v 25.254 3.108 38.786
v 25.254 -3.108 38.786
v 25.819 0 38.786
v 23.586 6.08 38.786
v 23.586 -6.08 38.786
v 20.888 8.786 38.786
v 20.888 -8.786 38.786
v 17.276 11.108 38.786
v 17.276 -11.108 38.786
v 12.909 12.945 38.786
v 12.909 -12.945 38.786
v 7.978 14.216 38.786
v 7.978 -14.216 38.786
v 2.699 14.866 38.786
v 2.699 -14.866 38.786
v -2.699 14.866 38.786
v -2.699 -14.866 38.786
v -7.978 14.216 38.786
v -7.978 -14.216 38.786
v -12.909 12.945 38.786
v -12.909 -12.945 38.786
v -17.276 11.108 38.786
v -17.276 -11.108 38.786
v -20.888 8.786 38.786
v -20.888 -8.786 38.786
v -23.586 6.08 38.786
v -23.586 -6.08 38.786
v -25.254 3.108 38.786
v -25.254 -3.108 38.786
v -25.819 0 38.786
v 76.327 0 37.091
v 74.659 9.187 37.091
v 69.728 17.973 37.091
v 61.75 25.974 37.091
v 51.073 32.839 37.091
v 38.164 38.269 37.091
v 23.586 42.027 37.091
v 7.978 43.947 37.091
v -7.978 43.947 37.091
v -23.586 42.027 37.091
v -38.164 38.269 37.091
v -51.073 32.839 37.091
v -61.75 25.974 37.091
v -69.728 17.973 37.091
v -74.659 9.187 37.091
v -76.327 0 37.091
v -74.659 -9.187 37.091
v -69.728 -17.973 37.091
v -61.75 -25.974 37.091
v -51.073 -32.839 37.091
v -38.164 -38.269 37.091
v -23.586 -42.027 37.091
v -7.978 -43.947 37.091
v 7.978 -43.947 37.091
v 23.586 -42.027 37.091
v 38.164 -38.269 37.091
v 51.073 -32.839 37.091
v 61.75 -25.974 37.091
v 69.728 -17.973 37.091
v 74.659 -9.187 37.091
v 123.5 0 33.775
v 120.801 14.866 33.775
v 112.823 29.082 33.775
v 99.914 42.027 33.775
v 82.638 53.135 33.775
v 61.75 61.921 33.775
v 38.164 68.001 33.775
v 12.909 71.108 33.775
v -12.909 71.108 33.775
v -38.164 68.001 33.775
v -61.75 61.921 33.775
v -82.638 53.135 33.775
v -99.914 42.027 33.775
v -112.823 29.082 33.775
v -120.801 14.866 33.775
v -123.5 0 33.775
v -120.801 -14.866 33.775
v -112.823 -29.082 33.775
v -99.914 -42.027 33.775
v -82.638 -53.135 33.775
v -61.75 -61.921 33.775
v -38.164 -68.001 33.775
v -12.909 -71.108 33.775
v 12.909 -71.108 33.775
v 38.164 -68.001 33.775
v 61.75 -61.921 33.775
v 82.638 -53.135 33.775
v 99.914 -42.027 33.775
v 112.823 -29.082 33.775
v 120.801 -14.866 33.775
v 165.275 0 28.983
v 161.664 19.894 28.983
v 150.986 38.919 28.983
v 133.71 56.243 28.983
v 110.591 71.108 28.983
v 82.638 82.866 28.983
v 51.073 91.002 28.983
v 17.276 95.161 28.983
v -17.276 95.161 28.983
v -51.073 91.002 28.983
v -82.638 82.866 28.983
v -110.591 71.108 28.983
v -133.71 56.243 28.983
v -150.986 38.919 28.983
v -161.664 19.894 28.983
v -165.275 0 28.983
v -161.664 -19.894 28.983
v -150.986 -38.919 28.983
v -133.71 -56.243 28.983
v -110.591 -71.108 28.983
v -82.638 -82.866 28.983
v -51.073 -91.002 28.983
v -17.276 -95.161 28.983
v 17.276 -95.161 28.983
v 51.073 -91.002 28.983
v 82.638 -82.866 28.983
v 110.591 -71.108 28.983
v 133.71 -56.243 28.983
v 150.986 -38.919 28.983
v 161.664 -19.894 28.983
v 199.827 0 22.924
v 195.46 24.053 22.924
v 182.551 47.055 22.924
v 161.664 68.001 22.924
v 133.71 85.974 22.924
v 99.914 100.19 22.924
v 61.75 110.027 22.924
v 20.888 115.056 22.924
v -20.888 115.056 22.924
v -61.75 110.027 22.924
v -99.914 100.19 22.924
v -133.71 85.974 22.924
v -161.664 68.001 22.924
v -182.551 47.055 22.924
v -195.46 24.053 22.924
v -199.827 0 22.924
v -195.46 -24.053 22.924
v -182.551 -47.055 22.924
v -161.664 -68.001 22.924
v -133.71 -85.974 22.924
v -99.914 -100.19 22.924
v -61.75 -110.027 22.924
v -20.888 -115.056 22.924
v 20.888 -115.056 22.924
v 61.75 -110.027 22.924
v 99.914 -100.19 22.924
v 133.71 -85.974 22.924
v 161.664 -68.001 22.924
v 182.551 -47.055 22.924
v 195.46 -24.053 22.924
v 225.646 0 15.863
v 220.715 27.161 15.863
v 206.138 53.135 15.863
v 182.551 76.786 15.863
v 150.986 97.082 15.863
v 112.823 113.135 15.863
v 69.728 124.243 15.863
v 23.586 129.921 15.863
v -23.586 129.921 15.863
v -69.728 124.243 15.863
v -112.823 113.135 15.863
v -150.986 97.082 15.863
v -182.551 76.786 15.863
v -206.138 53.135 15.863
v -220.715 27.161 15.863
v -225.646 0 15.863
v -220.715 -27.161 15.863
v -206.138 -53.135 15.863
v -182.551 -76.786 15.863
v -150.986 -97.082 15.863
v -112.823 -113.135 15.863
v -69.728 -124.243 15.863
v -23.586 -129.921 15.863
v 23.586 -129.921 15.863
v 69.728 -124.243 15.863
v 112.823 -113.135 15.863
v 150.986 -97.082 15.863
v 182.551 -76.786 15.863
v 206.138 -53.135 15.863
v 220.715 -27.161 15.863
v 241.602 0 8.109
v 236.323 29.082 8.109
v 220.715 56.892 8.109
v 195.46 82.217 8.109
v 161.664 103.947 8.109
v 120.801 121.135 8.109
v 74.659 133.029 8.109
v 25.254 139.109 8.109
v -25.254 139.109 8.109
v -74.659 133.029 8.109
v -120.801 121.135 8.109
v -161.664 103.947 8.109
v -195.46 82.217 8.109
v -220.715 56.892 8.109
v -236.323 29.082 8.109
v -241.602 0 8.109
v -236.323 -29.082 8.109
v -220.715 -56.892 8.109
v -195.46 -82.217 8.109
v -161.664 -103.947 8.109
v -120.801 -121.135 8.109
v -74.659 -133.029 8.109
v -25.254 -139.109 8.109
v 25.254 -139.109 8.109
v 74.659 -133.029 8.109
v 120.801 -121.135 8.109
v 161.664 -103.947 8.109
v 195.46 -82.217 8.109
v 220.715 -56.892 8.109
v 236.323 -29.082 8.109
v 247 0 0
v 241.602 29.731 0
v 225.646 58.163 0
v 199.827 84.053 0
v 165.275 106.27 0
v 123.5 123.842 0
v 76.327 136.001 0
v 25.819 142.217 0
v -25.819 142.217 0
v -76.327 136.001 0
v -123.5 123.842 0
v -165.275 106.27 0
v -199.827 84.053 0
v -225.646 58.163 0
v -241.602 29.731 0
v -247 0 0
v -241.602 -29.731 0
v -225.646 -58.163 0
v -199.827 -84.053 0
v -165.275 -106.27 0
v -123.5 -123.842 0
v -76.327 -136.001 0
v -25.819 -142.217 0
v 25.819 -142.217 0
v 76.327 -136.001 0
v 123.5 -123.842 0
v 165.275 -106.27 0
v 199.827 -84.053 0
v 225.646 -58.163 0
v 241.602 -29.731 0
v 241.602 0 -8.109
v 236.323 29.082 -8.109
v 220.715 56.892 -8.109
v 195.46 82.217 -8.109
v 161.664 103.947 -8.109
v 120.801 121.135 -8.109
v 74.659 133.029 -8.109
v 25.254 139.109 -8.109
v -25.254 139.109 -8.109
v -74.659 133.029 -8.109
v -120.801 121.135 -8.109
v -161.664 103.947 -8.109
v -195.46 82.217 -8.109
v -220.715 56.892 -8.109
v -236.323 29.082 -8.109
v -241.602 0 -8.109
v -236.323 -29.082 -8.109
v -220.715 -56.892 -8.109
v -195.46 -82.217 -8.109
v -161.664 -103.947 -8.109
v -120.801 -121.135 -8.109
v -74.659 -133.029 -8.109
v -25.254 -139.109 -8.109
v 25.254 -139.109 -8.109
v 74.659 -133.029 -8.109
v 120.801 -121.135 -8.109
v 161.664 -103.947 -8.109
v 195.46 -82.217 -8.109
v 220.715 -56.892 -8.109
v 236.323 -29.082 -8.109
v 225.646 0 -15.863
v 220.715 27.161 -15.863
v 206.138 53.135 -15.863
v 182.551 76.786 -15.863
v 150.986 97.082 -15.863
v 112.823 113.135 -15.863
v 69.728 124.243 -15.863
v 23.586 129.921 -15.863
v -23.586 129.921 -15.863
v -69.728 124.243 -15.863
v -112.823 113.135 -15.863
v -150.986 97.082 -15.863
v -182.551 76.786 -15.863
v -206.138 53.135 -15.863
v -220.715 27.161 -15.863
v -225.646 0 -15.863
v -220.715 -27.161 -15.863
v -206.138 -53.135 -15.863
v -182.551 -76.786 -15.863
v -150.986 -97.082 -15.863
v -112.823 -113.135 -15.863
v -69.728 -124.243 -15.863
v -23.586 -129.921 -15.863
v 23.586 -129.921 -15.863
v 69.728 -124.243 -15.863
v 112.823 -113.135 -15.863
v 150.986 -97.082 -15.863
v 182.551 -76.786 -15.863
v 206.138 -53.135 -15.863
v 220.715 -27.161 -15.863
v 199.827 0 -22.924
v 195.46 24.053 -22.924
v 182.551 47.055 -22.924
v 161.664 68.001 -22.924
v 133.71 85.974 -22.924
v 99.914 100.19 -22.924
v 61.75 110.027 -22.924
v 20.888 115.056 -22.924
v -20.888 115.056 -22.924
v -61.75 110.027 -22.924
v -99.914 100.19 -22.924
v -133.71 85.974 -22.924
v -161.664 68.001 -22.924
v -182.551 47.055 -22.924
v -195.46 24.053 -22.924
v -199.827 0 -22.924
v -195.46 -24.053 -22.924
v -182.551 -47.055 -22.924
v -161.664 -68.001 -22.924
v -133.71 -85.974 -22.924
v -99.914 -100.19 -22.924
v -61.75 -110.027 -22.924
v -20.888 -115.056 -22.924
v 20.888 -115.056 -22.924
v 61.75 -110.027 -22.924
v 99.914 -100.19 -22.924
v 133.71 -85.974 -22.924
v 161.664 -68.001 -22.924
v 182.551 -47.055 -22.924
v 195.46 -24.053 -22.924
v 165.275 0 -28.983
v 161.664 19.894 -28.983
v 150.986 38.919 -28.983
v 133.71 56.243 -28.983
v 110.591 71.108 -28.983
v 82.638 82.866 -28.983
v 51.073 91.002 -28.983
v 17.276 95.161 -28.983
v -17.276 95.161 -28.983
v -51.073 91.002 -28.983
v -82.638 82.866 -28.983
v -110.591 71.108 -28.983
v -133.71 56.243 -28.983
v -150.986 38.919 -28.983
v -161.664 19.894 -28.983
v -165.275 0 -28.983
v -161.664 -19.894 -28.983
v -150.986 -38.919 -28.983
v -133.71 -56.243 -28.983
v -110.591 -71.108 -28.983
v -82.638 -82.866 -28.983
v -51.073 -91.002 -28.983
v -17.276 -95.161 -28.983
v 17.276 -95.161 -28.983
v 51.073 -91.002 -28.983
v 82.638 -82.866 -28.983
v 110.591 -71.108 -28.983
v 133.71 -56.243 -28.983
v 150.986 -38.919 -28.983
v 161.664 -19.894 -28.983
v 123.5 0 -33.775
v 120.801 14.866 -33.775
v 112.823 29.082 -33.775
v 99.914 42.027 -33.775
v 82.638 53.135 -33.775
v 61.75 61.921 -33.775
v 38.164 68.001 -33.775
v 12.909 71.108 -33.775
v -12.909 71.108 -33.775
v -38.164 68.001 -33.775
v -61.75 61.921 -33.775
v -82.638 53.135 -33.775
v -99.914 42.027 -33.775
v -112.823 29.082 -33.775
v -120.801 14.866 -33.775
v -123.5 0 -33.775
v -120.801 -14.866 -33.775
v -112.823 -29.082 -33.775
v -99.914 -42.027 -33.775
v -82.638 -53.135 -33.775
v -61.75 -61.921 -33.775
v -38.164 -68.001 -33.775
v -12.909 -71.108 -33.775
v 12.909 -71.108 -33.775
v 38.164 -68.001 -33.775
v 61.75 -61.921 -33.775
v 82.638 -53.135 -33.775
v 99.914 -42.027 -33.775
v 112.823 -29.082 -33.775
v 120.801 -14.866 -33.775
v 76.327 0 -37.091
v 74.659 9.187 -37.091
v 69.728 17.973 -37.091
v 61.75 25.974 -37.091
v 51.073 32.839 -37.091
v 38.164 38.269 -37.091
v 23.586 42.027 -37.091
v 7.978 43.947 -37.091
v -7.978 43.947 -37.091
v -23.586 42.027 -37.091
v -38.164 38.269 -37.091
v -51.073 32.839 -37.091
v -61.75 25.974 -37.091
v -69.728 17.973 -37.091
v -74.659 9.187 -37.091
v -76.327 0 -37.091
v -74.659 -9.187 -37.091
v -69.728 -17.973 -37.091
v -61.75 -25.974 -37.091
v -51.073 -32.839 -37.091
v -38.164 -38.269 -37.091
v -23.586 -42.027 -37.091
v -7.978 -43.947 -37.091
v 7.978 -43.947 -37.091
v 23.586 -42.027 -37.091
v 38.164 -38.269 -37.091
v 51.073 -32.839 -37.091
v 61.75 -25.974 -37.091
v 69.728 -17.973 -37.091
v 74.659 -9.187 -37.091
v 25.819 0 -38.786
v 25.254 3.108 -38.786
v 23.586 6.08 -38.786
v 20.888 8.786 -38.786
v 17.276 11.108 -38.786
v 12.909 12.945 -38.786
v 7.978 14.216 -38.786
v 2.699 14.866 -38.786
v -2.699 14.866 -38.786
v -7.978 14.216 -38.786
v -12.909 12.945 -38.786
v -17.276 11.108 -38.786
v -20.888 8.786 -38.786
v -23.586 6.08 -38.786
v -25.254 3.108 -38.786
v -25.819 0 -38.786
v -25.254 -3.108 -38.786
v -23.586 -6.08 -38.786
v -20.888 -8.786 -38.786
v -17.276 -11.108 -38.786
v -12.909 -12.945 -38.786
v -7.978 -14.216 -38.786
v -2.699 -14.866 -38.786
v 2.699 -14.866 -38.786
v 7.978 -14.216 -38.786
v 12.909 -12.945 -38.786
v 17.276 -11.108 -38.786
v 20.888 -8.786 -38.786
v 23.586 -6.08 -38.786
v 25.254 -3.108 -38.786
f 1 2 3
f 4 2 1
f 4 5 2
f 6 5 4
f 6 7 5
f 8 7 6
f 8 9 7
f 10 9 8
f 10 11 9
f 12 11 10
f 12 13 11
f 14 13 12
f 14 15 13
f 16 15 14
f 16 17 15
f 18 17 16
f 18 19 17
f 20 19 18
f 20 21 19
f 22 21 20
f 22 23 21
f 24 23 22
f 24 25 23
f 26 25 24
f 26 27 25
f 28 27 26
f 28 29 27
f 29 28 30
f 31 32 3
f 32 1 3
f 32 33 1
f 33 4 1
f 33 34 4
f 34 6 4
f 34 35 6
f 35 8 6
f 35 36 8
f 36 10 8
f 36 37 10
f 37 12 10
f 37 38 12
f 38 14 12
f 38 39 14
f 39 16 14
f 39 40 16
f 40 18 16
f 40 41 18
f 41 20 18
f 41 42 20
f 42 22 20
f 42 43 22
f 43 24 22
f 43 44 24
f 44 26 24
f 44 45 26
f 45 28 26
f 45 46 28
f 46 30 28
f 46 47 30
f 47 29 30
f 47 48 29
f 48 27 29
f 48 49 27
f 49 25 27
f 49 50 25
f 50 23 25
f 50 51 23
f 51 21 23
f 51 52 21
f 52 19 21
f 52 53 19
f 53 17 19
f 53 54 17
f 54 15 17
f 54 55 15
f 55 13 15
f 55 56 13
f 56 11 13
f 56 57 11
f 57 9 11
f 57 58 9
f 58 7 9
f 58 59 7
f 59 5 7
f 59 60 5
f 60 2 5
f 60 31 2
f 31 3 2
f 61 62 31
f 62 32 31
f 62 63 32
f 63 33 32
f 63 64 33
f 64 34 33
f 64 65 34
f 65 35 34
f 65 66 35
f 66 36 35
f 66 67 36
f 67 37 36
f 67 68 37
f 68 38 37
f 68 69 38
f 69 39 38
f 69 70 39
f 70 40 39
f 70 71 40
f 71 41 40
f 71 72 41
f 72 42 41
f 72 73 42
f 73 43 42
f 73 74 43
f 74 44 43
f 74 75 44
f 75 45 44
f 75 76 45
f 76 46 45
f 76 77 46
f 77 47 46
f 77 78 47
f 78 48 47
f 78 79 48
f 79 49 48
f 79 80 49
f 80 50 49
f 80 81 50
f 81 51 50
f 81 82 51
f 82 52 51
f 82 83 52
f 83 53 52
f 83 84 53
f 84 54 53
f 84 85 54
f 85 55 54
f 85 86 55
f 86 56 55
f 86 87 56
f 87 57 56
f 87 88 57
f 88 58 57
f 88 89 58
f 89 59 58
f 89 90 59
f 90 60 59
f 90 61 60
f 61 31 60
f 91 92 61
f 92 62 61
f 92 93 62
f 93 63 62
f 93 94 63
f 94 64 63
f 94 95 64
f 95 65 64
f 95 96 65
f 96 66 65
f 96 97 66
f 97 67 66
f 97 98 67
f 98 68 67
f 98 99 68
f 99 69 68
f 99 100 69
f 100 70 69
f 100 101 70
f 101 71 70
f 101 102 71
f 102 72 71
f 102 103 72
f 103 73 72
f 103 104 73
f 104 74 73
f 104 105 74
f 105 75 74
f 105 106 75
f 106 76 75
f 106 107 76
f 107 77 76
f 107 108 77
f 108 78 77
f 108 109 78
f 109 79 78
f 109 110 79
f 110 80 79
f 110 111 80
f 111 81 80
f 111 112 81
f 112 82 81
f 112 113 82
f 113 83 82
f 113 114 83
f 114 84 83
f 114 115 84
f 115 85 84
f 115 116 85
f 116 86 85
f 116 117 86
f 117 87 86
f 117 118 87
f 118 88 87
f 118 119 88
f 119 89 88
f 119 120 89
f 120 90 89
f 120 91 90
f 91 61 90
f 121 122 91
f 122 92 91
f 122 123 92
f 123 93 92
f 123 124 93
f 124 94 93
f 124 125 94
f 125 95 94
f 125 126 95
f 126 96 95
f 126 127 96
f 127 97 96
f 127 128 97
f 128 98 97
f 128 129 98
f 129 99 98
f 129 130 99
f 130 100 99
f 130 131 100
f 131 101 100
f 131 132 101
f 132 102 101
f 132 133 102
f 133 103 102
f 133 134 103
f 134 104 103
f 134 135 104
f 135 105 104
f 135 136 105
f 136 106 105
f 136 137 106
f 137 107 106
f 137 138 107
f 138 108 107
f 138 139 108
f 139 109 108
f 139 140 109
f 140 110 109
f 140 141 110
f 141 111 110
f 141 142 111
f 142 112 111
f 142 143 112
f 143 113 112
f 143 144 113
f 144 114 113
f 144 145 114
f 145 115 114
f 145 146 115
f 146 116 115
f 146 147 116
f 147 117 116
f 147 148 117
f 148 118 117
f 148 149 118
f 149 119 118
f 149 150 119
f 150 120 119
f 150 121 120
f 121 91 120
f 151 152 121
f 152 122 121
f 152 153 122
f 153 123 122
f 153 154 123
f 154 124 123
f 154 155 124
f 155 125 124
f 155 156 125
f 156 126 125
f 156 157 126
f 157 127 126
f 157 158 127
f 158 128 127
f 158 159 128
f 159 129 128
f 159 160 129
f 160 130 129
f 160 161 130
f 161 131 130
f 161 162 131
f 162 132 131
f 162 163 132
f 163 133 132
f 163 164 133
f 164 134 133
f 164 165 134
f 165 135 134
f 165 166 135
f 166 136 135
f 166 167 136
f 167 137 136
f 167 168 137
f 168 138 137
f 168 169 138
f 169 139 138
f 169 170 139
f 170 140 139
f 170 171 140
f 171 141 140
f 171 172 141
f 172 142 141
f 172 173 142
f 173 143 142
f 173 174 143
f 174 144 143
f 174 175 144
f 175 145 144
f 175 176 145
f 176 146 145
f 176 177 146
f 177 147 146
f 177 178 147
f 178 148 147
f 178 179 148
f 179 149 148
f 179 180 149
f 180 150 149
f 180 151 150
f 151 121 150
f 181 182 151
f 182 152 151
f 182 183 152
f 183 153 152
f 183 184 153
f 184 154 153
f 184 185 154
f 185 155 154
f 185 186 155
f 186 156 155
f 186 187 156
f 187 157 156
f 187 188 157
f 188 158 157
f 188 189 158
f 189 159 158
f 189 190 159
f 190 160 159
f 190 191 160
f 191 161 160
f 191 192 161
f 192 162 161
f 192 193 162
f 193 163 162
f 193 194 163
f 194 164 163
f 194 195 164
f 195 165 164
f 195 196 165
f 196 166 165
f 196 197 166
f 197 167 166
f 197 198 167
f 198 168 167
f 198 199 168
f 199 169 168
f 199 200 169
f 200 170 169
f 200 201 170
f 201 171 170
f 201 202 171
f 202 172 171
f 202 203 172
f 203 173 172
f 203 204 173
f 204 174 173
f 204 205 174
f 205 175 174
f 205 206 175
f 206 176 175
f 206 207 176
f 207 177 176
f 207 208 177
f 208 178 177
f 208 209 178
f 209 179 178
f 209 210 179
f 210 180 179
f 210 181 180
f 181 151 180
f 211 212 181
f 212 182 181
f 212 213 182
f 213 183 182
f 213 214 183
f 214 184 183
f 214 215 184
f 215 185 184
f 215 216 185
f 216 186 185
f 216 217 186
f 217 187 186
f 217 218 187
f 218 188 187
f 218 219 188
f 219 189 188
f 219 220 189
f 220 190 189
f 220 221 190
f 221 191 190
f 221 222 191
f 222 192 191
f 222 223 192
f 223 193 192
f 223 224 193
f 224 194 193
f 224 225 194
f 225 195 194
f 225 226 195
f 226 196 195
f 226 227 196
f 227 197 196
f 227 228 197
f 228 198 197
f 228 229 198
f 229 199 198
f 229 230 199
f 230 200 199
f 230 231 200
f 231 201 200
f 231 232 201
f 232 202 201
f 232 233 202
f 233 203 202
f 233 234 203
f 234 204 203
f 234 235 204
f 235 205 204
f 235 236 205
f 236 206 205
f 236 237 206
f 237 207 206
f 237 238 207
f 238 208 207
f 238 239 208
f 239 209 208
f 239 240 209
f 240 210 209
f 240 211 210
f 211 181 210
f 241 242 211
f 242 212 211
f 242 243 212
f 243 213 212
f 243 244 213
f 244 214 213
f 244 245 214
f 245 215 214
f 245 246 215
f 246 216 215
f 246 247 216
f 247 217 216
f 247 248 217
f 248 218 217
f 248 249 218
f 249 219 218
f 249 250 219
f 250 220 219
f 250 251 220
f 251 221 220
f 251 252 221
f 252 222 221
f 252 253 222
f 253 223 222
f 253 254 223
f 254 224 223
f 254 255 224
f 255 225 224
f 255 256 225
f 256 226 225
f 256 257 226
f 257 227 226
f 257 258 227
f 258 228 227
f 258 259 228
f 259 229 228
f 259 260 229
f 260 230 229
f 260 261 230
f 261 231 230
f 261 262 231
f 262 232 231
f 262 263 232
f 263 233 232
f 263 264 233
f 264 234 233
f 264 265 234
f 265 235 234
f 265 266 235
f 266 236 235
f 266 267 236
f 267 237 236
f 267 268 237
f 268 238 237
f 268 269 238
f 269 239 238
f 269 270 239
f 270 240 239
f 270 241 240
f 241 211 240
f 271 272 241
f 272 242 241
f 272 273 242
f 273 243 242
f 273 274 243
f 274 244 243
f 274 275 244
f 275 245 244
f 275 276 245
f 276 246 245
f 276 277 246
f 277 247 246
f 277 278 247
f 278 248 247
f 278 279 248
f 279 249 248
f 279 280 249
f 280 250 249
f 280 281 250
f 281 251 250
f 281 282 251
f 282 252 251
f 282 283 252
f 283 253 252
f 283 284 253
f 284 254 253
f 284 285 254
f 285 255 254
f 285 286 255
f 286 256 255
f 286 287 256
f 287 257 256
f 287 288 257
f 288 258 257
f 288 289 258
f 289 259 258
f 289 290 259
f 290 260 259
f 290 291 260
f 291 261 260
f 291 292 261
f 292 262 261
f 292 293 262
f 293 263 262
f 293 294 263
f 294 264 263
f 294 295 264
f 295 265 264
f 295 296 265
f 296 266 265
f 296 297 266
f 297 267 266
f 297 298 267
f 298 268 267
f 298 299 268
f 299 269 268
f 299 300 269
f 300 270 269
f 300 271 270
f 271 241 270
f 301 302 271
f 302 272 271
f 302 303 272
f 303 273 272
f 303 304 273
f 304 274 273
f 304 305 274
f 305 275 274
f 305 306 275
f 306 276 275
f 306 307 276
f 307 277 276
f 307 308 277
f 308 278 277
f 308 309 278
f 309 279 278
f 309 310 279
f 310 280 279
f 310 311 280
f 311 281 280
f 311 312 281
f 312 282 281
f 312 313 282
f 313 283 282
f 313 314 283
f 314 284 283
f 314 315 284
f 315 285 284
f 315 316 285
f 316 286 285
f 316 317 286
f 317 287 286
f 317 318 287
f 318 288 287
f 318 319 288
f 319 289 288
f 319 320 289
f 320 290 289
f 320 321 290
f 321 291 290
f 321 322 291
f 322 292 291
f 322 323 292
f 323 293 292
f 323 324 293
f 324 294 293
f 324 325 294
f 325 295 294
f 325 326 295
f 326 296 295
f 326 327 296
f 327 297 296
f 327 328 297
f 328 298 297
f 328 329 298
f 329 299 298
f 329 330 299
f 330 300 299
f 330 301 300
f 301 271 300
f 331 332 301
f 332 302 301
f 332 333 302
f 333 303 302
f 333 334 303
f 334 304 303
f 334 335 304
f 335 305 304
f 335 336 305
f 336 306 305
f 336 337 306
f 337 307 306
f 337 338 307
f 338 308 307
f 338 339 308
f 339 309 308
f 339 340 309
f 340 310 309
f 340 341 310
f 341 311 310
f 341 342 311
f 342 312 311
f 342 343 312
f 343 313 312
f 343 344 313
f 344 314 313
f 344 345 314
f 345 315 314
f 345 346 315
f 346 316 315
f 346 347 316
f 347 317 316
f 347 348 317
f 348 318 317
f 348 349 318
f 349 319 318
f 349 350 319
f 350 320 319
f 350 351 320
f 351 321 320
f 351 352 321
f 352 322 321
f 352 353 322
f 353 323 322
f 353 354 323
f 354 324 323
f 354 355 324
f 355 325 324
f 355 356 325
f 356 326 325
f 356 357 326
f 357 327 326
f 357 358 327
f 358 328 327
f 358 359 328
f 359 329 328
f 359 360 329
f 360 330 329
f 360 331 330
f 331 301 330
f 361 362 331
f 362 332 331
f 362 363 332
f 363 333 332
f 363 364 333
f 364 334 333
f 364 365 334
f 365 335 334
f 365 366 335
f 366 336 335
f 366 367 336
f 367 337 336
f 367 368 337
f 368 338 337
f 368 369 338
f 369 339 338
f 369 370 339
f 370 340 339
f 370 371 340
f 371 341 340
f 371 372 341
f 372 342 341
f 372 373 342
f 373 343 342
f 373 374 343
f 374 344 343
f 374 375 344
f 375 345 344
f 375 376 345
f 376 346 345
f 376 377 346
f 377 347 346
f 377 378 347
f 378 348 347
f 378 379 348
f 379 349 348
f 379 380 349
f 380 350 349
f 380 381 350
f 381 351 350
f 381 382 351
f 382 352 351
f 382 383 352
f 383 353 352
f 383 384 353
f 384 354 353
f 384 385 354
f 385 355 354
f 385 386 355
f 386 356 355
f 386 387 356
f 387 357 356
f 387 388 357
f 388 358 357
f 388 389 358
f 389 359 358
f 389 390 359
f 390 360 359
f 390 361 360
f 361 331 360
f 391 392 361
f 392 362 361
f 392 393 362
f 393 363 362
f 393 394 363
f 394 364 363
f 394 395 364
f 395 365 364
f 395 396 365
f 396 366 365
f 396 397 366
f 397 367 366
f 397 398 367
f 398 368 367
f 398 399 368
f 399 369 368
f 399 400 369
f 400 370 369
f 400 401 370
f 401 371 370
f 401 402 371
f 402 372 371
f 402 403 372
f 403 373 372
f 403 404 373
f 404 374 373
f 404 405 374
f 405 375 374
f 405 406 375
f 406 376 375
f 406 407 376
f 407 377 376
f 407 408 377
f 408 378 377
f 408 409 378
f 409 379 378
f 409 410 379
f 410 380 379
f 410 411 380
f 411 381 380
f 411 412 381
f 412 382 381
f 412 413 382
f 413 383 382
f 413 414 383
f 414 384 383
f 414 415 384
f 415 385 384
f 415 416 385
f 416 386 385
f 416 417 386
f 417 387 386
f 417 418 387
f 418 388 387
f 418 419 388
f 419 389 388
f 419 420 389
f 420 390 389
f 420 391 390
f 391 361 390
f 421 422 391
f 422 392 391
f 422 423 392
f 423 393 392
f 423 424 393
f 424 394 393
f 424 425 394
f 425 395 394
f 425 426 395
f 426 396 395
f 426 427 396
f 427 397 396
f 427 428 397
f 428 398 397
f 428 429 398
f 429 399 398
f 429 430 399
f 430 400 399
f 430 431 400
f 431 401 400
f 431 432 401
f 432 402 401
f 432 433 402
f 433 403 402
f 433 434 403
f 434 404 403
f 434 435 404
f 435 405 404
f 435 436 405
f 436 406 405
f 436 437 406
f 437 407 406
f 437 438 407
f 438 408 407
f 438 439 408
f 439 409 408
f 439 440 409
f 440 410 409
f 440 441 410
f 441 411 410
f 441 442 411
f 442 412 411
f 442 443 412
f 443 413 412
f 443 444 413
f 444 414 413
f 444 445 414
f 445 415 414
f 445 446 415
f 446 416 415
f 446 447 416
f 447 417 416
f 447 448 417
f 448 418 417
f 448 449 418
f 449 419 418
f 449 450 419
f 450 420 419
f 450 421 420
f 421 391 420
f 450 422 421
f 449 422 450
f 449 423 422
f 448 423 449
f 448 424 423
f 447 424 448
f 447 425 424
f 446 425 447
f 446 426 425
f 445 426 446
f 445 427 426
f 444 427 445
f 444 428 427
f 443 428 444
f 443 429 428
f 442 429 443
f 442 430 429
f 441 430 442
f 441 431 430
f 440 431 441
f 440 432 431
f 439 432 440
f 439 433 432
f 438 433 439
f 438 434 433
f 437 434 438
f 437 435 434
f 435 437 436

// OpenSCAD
// Generated by SolidPython 1.0.1 on 2020-07-29 00:46:54


scale(v = [19, 11, 3]) {
	sphere(r = 13);
}
/***********************************************
*********      SolidPython code:      **********
************************************************
 
# import packages: SolidPython
from solid import *
from solid.utils import *
from itertools import chain, combinations, permutations


class Resize:

    def __init__(self, scad_file):
        self.scad_file = scad_file
        #self.scad_file = import_scad(scad_file)
        # cone/cylinder param:
        self.r1 = 0
        self.r2 = 0
        self.h = 0
        # rectangular prism param:
        self.w = 0
        self.l = 0
        # ellipse param:
        self.r = 0

    # import OpenScad code (file name corresponds to shape)


    # classify shape + parameters
    def assign(self, param1, param2, param3):
        if self.scad_file == 'cone.scad':
            self.r1 = param1
            self.r2 = param2
            self.h = param3
        elif self.scad_file == 'cylinder.scad':
            self.r1 = param1
            self.r2 = param2
            self.h = param3
        elif self.scad_file == 'rectangularPrism.scad':
            self.h = param1
            self.l = param2
            self.w = param3
        else:
            self.r = param1
            self.h = param2

    # resize parameters
    def iterate(self):
        x = range(3, 20, 2)
        i = 1
        if self.scad_file == 'cone.scad':
            tempList = list(permutations(x, 2))
            for temp in tempList:
                param1 = temp[0]
                param2 = temp[1]
                filepath = 'produced_scad_files/' + 'cone' + str(param1) + '_' + str(param2) + '_' + '.scad'
                scad_render_to_file(cylinder(h=param1, r1=param2, r2=0), filepath)

        elif self.scad_file == 'cylinder.scad':
            tempList = list(permutations(x, 3))
            for temp in tempList:
                param1 = temp[0]
                param2 = temp[1]
                filepath = 'produced_scad_files/' + 'cylinder' + str(param1) + '_' + str(param2) + '_' + '.scad'
                scad_render_to_file(cylinder(h=param1, r1=param2, r2=param2), filepath)

        elif self.scad_file == 'rectangularPrism.scad':
            tempList = list(permutations(x, 3))
            for temp in tempList:
                param1 = temp[0]
                param2 = temp[1]
                param3 = temp[2]
                filepath = 'produced_scad_files/' + 'rectangularPrism' + str(param1) + '_' + str(param2) + '_' + str(
                    param3) + '.scad'
                scad_render_to_file(cube(size=(param1, param2, param3)), filepath)

        elif self.scad_file == 'ellipse.scad':
            tempList = list(permutations(x, 4))
            for temp in tempList:
                param1 = temp[0]
                param2 = temp[1]
                param3 = temp[2]
                param4 = temp[3]
                filepath = 'produced_scad_files/' + 'ellipse' + str(param1) + '_' + str(param2) + '_' + str(param3) + '_' + str(param4) + '.scad'
                scad_render_to_file(scale([param1, param2, param3])(sphere(r=param4)), filepath)

    def render_to_scadfile(self):
        scad_render_to_file(scad, 'example.scad') 
 
************************************************/
